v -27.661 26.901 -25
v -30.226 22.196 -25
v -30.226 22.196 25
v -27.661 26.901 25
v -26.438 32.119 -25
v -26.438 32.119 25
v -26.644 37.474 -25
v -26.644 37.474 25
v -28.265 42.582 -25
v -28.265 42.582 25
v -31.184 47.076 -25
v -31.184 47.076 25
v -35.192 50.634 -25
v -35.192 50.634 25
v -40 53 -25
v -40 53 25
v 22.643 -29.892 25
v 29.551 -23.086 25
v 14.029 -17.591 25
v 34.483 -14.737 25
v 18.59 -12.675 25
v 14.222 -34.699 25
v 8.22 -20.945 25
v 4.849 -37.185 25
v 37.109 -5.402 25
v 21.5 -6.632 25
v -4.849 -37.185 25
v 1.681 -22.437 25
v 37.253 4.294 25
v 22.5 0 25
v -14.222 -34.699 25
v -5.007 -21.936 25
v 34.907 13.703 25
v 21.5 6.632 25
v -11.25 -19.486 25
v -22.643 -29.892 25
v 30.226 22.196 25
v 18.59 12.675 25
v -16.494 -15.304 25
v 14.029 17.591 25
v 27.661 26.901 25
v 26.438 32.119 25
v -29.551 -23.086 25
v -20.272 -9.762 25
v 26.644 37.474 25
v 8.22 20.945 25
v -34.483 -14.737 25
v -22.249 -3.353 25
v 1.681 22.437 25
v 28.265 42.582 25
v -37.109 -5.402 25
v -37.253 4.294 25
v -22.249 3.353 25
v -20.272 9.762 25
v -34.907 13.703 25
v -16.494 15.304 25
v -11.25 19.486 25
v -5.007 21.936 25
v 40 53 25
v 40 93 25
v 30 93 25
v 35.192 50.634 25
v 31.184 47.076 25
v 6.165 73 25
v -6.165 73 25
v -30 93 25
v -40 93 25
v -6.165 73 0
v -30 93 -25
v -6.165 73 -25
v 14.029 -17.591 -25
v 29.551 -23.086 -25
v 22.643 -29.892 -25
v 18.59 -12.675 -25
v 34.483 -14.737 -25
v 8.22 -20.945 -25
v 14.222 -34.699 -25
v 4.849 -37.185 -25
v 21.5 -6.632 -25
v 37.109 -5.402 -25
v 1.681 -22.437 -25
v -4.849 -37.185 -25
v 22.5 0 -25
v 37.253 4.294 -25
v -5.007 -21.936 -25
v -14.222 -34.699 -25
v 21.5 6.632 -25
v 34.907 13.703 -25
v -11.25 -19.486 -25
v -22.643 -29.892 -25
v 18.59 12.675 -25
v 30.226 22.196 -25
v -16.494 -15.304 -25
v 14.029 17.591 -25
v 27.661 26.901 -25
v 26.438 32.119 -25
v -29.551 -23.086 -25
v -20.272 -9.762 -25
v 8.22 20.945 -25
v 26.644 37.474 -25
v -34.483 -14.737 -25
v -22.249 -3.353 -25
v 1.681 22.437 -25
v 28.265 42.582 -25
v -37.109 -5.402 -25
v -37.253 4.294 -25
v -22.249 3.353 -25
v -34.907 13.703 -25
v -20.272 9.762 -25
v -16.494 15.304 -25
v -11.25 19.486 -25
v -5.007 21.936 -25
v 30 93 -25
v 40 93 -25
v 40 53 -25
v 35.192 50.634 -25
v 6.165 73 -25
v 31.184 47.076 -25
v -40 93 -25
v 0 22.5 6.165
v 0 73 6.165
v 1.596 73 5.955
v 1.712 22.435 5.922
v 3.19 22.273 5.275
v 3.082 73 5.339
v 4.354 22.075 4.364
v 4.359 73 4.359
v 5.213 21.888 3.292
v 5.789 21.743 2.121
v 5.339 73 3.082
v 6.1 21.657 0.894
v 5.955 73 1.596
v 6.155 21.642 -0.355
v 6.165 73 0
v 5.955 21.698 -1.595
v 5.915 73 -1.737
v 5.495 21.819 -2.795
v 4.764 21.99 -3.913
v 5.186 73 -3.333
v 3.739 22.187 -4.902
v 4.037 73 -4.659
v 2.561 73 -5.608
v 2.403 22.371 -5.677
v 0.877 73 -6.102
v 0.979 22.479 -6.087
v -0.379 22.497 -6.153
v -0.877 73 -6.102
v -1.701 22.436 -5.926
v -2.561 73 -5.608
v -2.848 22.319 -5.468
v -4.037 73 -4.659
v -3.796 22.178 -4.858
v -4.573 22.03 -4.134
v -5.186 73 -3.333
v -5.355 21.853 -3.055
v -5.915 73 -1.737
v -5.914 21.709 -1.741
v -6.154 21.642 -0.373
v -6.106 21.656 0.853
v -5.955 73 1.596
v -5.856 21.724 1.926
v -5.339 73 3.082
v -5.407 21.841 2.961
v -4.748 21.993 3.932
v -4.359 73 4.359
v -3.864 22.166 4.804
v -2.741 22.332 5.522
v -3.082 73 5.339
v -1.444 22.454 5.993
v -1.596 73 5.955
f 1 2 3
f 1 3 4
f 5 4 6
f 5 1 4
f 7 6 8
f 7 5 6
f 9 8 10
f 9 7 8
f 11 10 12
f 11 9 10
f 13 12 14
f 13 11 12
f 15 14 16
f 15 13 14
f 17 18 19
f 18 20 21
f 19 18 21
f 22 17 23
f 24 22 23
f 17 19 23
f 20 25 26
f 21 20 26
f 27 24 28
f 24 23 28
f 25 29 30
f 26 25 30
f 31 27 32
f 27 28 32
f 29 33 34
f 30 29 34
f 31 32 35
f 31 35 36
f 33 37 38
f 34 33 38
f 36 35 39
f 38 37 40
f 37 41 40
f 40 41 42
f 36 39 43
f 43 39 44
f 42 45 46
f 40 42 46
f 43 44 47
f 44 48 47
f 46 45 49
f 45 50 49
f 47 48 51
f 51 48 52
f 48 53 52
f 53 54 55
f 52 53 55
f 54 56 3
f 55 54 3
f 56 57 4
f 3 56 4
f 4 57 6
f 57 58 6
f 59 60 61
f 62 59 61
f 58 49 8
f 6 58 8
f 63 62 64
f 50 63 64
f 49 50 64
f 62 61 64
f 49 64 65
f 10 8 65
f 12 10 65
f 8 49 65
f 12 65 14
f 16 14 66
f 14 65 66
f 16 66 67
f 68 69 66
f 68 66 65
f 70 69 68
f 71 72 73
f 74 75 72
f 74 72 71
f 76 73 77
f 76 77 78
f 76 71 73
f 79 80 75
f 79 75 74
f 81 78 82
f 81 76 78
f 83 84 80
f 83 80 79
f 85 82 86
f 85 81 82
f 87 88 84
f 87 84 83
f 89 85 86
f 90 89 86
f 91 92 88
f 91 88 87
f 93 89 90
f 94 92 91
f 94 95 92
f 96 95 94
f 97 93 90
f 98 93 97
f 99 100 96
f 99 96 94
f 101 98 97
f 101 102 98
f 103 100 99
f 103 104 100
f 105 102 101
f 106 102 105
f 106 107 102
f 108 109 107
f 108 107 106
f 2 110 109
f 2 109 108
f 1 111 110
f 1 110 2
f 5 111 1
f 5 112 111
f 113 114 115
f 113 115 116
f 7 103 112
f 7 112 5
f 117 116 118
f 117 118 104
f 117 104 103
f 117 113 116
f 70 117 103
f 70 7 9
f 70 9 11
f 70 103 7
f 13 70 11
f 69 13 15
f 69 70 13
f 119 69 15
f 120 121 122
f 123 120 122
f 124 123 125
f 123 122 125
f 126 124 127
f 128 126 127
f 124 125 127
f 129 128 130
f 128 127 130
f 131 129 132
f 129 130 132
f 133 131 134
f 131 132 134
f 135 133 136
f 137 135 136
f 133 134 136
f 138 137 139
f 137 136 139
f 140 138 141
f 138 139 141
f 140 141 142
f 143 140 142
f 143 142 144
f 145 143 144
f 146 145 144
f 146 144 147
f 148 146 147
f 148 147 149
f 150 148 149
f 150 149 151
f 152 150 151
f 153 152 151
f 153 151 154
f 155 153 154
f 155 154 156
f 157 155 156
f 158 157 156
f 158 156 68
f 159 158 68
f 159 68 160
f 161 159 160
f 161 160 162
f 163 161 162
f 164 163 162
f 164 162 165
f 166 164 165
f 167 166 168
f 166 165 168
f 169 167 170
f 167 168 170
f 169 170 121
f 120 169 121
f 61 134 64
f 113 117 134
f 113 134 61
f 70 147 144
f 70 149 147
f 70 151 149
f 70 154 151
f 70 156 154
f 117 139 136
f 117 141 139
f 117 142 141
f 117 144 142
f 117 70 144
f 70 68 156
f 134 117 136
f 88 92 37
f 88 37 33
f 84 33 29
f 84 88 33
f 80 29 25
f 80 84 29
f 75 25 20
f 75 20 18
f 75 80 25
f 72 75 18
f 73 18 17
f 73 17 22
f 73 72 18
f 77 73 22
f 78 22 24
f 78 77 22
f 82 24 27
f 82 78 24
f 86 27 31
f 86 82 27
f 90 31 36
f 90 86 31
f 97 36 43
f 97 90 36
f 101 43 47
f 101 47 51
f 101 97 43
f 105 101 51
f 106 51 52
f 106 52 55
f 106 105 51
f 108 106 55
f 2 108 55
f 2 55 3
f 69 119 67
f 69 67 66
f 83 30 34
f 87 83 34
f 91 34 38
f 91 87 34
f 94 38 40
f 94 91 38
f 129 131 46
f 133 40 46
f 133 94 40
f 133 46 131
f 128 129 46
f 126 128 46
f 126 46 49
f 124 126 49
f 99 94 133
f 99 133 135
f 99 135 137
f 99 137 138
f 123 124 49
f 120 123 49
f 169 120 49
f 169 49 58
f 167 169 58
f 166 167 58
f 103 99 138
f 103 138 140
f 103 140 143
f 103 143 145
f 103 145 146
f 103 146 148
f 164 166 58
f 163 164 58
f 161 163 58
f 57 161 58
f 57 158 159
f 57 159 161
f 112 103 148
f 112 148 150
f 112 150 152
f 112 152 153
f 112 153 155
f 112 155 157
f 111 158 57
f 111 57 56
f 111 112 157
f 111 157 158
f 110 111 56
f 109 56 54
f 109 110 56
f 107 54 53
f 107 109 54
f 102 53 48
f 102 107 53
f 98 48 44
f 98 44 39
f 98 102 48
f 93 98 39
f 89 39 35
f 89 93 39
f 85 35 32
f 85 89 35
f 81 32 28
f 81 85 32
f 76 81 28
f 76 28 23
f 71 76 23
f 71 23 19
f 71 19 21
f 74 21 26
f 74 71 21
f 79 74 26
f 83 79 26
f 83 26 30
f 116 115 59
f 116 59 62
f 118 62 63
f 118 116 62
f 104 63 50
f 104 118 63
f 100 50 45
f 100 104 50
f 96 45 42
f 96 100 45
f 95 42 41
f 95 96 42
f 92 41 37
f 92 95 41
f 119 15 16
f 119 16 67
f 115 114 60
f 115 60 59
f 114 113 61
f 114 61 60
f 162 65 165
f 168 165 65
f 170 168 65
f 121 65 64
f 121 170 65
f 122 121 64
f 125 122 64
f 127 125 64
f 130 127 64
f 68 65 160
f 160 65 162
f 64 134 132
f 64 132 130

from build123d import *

# Parameters (mm, degrees)
SALIENTE_EXTRUIR1_DEPTH      = 25
SALIENTE_EXTRUIR1_DEPTH_BACK = 25
CROQUIS2_R                   = 22.5
CORTAR_EXTRUIR1_REACH        = 122.147
CORTAR_EXTRUIR1_END_RADIUS   = 22.5
CROQUIS3_R                   = 6.164928148


with BuildPart() as part:
    # Croquis2 → Saliente-Extruir1 (new, two sides: drawn at the far end of the back side and taken through both)
    with BuildSketch(Plane.XY.offset(-SALIENTE_EXTRUIR1_DEPTH_BACK)):
        with BuildLine():
            Line((-40, 53), (-40, 93))
            Line((-40, 93), (-30, 93))
            Line((-30, 93), (-6.164928148, 73))
            Line((-6.164928148, 73), (6.164928148, 73))
            Line((6.164928148, 73), (30, 93))
            Line((30, 93), (40, 93))
            Line((40, 93), (40, 53))
            ThreePointArc((40, 53), (27.282813289, 40.082394099), (30.225762041, 22.19579485))
            ThreePointArc((30.225762041, 22.19579485), (0, -37.5), (-30.225762041, 22.19579485))
            ThreePointArc((-30.225762041, 22.19579485), (-27.282813289, 40.082394099), (-40, 53))
        make_face()
        Circle(CROQUIS2_R, mode=Mode.SUBTRACT)
    extrude(amount=SALIENTE_EXTRUIR1_DEPTH + SALIENTE_EXTRUIR1_DEPTH_BACK)

    # Cortar-Extruir1: up to this cylinder (the profile starts outside it)
    cortar_extruir1_end = Plane(origin=(0, 0, 0), z_dir=(0, 0, 1)) * Cylinder(CORTAR_EXTRUIR1_END_RADIUS, 290.294, mode=Mode.PRIVATE)
    # Croquis3 → Cortar-Extruir1 (cut, up to the surface)
    with BuildSketch(Plane(origin=(0, 73, 0), x_dir=(1, 0, 0), z_dir=(0, 1, 0)), mode=Mode.PRIVATE) as cortar_extruir1_sk1:
        with Locations(Location((0, 0, 0), (0, 0, 270))):
            Circle(CROQUIS3_R)
    cortar_extruir1_tool1 = extrude(cortar_extruir1_sk1.sketch, amount=-CORTAR_EXTRUIR1_REACH, mode=Mode.PRIVATE) - cortar_extruir1_end
    add(cortar_extruir1_tool1.solids().sort_by_distance((0, 73, 0))[0], mode=Mode.SUBTRACT)


solid = part.part
